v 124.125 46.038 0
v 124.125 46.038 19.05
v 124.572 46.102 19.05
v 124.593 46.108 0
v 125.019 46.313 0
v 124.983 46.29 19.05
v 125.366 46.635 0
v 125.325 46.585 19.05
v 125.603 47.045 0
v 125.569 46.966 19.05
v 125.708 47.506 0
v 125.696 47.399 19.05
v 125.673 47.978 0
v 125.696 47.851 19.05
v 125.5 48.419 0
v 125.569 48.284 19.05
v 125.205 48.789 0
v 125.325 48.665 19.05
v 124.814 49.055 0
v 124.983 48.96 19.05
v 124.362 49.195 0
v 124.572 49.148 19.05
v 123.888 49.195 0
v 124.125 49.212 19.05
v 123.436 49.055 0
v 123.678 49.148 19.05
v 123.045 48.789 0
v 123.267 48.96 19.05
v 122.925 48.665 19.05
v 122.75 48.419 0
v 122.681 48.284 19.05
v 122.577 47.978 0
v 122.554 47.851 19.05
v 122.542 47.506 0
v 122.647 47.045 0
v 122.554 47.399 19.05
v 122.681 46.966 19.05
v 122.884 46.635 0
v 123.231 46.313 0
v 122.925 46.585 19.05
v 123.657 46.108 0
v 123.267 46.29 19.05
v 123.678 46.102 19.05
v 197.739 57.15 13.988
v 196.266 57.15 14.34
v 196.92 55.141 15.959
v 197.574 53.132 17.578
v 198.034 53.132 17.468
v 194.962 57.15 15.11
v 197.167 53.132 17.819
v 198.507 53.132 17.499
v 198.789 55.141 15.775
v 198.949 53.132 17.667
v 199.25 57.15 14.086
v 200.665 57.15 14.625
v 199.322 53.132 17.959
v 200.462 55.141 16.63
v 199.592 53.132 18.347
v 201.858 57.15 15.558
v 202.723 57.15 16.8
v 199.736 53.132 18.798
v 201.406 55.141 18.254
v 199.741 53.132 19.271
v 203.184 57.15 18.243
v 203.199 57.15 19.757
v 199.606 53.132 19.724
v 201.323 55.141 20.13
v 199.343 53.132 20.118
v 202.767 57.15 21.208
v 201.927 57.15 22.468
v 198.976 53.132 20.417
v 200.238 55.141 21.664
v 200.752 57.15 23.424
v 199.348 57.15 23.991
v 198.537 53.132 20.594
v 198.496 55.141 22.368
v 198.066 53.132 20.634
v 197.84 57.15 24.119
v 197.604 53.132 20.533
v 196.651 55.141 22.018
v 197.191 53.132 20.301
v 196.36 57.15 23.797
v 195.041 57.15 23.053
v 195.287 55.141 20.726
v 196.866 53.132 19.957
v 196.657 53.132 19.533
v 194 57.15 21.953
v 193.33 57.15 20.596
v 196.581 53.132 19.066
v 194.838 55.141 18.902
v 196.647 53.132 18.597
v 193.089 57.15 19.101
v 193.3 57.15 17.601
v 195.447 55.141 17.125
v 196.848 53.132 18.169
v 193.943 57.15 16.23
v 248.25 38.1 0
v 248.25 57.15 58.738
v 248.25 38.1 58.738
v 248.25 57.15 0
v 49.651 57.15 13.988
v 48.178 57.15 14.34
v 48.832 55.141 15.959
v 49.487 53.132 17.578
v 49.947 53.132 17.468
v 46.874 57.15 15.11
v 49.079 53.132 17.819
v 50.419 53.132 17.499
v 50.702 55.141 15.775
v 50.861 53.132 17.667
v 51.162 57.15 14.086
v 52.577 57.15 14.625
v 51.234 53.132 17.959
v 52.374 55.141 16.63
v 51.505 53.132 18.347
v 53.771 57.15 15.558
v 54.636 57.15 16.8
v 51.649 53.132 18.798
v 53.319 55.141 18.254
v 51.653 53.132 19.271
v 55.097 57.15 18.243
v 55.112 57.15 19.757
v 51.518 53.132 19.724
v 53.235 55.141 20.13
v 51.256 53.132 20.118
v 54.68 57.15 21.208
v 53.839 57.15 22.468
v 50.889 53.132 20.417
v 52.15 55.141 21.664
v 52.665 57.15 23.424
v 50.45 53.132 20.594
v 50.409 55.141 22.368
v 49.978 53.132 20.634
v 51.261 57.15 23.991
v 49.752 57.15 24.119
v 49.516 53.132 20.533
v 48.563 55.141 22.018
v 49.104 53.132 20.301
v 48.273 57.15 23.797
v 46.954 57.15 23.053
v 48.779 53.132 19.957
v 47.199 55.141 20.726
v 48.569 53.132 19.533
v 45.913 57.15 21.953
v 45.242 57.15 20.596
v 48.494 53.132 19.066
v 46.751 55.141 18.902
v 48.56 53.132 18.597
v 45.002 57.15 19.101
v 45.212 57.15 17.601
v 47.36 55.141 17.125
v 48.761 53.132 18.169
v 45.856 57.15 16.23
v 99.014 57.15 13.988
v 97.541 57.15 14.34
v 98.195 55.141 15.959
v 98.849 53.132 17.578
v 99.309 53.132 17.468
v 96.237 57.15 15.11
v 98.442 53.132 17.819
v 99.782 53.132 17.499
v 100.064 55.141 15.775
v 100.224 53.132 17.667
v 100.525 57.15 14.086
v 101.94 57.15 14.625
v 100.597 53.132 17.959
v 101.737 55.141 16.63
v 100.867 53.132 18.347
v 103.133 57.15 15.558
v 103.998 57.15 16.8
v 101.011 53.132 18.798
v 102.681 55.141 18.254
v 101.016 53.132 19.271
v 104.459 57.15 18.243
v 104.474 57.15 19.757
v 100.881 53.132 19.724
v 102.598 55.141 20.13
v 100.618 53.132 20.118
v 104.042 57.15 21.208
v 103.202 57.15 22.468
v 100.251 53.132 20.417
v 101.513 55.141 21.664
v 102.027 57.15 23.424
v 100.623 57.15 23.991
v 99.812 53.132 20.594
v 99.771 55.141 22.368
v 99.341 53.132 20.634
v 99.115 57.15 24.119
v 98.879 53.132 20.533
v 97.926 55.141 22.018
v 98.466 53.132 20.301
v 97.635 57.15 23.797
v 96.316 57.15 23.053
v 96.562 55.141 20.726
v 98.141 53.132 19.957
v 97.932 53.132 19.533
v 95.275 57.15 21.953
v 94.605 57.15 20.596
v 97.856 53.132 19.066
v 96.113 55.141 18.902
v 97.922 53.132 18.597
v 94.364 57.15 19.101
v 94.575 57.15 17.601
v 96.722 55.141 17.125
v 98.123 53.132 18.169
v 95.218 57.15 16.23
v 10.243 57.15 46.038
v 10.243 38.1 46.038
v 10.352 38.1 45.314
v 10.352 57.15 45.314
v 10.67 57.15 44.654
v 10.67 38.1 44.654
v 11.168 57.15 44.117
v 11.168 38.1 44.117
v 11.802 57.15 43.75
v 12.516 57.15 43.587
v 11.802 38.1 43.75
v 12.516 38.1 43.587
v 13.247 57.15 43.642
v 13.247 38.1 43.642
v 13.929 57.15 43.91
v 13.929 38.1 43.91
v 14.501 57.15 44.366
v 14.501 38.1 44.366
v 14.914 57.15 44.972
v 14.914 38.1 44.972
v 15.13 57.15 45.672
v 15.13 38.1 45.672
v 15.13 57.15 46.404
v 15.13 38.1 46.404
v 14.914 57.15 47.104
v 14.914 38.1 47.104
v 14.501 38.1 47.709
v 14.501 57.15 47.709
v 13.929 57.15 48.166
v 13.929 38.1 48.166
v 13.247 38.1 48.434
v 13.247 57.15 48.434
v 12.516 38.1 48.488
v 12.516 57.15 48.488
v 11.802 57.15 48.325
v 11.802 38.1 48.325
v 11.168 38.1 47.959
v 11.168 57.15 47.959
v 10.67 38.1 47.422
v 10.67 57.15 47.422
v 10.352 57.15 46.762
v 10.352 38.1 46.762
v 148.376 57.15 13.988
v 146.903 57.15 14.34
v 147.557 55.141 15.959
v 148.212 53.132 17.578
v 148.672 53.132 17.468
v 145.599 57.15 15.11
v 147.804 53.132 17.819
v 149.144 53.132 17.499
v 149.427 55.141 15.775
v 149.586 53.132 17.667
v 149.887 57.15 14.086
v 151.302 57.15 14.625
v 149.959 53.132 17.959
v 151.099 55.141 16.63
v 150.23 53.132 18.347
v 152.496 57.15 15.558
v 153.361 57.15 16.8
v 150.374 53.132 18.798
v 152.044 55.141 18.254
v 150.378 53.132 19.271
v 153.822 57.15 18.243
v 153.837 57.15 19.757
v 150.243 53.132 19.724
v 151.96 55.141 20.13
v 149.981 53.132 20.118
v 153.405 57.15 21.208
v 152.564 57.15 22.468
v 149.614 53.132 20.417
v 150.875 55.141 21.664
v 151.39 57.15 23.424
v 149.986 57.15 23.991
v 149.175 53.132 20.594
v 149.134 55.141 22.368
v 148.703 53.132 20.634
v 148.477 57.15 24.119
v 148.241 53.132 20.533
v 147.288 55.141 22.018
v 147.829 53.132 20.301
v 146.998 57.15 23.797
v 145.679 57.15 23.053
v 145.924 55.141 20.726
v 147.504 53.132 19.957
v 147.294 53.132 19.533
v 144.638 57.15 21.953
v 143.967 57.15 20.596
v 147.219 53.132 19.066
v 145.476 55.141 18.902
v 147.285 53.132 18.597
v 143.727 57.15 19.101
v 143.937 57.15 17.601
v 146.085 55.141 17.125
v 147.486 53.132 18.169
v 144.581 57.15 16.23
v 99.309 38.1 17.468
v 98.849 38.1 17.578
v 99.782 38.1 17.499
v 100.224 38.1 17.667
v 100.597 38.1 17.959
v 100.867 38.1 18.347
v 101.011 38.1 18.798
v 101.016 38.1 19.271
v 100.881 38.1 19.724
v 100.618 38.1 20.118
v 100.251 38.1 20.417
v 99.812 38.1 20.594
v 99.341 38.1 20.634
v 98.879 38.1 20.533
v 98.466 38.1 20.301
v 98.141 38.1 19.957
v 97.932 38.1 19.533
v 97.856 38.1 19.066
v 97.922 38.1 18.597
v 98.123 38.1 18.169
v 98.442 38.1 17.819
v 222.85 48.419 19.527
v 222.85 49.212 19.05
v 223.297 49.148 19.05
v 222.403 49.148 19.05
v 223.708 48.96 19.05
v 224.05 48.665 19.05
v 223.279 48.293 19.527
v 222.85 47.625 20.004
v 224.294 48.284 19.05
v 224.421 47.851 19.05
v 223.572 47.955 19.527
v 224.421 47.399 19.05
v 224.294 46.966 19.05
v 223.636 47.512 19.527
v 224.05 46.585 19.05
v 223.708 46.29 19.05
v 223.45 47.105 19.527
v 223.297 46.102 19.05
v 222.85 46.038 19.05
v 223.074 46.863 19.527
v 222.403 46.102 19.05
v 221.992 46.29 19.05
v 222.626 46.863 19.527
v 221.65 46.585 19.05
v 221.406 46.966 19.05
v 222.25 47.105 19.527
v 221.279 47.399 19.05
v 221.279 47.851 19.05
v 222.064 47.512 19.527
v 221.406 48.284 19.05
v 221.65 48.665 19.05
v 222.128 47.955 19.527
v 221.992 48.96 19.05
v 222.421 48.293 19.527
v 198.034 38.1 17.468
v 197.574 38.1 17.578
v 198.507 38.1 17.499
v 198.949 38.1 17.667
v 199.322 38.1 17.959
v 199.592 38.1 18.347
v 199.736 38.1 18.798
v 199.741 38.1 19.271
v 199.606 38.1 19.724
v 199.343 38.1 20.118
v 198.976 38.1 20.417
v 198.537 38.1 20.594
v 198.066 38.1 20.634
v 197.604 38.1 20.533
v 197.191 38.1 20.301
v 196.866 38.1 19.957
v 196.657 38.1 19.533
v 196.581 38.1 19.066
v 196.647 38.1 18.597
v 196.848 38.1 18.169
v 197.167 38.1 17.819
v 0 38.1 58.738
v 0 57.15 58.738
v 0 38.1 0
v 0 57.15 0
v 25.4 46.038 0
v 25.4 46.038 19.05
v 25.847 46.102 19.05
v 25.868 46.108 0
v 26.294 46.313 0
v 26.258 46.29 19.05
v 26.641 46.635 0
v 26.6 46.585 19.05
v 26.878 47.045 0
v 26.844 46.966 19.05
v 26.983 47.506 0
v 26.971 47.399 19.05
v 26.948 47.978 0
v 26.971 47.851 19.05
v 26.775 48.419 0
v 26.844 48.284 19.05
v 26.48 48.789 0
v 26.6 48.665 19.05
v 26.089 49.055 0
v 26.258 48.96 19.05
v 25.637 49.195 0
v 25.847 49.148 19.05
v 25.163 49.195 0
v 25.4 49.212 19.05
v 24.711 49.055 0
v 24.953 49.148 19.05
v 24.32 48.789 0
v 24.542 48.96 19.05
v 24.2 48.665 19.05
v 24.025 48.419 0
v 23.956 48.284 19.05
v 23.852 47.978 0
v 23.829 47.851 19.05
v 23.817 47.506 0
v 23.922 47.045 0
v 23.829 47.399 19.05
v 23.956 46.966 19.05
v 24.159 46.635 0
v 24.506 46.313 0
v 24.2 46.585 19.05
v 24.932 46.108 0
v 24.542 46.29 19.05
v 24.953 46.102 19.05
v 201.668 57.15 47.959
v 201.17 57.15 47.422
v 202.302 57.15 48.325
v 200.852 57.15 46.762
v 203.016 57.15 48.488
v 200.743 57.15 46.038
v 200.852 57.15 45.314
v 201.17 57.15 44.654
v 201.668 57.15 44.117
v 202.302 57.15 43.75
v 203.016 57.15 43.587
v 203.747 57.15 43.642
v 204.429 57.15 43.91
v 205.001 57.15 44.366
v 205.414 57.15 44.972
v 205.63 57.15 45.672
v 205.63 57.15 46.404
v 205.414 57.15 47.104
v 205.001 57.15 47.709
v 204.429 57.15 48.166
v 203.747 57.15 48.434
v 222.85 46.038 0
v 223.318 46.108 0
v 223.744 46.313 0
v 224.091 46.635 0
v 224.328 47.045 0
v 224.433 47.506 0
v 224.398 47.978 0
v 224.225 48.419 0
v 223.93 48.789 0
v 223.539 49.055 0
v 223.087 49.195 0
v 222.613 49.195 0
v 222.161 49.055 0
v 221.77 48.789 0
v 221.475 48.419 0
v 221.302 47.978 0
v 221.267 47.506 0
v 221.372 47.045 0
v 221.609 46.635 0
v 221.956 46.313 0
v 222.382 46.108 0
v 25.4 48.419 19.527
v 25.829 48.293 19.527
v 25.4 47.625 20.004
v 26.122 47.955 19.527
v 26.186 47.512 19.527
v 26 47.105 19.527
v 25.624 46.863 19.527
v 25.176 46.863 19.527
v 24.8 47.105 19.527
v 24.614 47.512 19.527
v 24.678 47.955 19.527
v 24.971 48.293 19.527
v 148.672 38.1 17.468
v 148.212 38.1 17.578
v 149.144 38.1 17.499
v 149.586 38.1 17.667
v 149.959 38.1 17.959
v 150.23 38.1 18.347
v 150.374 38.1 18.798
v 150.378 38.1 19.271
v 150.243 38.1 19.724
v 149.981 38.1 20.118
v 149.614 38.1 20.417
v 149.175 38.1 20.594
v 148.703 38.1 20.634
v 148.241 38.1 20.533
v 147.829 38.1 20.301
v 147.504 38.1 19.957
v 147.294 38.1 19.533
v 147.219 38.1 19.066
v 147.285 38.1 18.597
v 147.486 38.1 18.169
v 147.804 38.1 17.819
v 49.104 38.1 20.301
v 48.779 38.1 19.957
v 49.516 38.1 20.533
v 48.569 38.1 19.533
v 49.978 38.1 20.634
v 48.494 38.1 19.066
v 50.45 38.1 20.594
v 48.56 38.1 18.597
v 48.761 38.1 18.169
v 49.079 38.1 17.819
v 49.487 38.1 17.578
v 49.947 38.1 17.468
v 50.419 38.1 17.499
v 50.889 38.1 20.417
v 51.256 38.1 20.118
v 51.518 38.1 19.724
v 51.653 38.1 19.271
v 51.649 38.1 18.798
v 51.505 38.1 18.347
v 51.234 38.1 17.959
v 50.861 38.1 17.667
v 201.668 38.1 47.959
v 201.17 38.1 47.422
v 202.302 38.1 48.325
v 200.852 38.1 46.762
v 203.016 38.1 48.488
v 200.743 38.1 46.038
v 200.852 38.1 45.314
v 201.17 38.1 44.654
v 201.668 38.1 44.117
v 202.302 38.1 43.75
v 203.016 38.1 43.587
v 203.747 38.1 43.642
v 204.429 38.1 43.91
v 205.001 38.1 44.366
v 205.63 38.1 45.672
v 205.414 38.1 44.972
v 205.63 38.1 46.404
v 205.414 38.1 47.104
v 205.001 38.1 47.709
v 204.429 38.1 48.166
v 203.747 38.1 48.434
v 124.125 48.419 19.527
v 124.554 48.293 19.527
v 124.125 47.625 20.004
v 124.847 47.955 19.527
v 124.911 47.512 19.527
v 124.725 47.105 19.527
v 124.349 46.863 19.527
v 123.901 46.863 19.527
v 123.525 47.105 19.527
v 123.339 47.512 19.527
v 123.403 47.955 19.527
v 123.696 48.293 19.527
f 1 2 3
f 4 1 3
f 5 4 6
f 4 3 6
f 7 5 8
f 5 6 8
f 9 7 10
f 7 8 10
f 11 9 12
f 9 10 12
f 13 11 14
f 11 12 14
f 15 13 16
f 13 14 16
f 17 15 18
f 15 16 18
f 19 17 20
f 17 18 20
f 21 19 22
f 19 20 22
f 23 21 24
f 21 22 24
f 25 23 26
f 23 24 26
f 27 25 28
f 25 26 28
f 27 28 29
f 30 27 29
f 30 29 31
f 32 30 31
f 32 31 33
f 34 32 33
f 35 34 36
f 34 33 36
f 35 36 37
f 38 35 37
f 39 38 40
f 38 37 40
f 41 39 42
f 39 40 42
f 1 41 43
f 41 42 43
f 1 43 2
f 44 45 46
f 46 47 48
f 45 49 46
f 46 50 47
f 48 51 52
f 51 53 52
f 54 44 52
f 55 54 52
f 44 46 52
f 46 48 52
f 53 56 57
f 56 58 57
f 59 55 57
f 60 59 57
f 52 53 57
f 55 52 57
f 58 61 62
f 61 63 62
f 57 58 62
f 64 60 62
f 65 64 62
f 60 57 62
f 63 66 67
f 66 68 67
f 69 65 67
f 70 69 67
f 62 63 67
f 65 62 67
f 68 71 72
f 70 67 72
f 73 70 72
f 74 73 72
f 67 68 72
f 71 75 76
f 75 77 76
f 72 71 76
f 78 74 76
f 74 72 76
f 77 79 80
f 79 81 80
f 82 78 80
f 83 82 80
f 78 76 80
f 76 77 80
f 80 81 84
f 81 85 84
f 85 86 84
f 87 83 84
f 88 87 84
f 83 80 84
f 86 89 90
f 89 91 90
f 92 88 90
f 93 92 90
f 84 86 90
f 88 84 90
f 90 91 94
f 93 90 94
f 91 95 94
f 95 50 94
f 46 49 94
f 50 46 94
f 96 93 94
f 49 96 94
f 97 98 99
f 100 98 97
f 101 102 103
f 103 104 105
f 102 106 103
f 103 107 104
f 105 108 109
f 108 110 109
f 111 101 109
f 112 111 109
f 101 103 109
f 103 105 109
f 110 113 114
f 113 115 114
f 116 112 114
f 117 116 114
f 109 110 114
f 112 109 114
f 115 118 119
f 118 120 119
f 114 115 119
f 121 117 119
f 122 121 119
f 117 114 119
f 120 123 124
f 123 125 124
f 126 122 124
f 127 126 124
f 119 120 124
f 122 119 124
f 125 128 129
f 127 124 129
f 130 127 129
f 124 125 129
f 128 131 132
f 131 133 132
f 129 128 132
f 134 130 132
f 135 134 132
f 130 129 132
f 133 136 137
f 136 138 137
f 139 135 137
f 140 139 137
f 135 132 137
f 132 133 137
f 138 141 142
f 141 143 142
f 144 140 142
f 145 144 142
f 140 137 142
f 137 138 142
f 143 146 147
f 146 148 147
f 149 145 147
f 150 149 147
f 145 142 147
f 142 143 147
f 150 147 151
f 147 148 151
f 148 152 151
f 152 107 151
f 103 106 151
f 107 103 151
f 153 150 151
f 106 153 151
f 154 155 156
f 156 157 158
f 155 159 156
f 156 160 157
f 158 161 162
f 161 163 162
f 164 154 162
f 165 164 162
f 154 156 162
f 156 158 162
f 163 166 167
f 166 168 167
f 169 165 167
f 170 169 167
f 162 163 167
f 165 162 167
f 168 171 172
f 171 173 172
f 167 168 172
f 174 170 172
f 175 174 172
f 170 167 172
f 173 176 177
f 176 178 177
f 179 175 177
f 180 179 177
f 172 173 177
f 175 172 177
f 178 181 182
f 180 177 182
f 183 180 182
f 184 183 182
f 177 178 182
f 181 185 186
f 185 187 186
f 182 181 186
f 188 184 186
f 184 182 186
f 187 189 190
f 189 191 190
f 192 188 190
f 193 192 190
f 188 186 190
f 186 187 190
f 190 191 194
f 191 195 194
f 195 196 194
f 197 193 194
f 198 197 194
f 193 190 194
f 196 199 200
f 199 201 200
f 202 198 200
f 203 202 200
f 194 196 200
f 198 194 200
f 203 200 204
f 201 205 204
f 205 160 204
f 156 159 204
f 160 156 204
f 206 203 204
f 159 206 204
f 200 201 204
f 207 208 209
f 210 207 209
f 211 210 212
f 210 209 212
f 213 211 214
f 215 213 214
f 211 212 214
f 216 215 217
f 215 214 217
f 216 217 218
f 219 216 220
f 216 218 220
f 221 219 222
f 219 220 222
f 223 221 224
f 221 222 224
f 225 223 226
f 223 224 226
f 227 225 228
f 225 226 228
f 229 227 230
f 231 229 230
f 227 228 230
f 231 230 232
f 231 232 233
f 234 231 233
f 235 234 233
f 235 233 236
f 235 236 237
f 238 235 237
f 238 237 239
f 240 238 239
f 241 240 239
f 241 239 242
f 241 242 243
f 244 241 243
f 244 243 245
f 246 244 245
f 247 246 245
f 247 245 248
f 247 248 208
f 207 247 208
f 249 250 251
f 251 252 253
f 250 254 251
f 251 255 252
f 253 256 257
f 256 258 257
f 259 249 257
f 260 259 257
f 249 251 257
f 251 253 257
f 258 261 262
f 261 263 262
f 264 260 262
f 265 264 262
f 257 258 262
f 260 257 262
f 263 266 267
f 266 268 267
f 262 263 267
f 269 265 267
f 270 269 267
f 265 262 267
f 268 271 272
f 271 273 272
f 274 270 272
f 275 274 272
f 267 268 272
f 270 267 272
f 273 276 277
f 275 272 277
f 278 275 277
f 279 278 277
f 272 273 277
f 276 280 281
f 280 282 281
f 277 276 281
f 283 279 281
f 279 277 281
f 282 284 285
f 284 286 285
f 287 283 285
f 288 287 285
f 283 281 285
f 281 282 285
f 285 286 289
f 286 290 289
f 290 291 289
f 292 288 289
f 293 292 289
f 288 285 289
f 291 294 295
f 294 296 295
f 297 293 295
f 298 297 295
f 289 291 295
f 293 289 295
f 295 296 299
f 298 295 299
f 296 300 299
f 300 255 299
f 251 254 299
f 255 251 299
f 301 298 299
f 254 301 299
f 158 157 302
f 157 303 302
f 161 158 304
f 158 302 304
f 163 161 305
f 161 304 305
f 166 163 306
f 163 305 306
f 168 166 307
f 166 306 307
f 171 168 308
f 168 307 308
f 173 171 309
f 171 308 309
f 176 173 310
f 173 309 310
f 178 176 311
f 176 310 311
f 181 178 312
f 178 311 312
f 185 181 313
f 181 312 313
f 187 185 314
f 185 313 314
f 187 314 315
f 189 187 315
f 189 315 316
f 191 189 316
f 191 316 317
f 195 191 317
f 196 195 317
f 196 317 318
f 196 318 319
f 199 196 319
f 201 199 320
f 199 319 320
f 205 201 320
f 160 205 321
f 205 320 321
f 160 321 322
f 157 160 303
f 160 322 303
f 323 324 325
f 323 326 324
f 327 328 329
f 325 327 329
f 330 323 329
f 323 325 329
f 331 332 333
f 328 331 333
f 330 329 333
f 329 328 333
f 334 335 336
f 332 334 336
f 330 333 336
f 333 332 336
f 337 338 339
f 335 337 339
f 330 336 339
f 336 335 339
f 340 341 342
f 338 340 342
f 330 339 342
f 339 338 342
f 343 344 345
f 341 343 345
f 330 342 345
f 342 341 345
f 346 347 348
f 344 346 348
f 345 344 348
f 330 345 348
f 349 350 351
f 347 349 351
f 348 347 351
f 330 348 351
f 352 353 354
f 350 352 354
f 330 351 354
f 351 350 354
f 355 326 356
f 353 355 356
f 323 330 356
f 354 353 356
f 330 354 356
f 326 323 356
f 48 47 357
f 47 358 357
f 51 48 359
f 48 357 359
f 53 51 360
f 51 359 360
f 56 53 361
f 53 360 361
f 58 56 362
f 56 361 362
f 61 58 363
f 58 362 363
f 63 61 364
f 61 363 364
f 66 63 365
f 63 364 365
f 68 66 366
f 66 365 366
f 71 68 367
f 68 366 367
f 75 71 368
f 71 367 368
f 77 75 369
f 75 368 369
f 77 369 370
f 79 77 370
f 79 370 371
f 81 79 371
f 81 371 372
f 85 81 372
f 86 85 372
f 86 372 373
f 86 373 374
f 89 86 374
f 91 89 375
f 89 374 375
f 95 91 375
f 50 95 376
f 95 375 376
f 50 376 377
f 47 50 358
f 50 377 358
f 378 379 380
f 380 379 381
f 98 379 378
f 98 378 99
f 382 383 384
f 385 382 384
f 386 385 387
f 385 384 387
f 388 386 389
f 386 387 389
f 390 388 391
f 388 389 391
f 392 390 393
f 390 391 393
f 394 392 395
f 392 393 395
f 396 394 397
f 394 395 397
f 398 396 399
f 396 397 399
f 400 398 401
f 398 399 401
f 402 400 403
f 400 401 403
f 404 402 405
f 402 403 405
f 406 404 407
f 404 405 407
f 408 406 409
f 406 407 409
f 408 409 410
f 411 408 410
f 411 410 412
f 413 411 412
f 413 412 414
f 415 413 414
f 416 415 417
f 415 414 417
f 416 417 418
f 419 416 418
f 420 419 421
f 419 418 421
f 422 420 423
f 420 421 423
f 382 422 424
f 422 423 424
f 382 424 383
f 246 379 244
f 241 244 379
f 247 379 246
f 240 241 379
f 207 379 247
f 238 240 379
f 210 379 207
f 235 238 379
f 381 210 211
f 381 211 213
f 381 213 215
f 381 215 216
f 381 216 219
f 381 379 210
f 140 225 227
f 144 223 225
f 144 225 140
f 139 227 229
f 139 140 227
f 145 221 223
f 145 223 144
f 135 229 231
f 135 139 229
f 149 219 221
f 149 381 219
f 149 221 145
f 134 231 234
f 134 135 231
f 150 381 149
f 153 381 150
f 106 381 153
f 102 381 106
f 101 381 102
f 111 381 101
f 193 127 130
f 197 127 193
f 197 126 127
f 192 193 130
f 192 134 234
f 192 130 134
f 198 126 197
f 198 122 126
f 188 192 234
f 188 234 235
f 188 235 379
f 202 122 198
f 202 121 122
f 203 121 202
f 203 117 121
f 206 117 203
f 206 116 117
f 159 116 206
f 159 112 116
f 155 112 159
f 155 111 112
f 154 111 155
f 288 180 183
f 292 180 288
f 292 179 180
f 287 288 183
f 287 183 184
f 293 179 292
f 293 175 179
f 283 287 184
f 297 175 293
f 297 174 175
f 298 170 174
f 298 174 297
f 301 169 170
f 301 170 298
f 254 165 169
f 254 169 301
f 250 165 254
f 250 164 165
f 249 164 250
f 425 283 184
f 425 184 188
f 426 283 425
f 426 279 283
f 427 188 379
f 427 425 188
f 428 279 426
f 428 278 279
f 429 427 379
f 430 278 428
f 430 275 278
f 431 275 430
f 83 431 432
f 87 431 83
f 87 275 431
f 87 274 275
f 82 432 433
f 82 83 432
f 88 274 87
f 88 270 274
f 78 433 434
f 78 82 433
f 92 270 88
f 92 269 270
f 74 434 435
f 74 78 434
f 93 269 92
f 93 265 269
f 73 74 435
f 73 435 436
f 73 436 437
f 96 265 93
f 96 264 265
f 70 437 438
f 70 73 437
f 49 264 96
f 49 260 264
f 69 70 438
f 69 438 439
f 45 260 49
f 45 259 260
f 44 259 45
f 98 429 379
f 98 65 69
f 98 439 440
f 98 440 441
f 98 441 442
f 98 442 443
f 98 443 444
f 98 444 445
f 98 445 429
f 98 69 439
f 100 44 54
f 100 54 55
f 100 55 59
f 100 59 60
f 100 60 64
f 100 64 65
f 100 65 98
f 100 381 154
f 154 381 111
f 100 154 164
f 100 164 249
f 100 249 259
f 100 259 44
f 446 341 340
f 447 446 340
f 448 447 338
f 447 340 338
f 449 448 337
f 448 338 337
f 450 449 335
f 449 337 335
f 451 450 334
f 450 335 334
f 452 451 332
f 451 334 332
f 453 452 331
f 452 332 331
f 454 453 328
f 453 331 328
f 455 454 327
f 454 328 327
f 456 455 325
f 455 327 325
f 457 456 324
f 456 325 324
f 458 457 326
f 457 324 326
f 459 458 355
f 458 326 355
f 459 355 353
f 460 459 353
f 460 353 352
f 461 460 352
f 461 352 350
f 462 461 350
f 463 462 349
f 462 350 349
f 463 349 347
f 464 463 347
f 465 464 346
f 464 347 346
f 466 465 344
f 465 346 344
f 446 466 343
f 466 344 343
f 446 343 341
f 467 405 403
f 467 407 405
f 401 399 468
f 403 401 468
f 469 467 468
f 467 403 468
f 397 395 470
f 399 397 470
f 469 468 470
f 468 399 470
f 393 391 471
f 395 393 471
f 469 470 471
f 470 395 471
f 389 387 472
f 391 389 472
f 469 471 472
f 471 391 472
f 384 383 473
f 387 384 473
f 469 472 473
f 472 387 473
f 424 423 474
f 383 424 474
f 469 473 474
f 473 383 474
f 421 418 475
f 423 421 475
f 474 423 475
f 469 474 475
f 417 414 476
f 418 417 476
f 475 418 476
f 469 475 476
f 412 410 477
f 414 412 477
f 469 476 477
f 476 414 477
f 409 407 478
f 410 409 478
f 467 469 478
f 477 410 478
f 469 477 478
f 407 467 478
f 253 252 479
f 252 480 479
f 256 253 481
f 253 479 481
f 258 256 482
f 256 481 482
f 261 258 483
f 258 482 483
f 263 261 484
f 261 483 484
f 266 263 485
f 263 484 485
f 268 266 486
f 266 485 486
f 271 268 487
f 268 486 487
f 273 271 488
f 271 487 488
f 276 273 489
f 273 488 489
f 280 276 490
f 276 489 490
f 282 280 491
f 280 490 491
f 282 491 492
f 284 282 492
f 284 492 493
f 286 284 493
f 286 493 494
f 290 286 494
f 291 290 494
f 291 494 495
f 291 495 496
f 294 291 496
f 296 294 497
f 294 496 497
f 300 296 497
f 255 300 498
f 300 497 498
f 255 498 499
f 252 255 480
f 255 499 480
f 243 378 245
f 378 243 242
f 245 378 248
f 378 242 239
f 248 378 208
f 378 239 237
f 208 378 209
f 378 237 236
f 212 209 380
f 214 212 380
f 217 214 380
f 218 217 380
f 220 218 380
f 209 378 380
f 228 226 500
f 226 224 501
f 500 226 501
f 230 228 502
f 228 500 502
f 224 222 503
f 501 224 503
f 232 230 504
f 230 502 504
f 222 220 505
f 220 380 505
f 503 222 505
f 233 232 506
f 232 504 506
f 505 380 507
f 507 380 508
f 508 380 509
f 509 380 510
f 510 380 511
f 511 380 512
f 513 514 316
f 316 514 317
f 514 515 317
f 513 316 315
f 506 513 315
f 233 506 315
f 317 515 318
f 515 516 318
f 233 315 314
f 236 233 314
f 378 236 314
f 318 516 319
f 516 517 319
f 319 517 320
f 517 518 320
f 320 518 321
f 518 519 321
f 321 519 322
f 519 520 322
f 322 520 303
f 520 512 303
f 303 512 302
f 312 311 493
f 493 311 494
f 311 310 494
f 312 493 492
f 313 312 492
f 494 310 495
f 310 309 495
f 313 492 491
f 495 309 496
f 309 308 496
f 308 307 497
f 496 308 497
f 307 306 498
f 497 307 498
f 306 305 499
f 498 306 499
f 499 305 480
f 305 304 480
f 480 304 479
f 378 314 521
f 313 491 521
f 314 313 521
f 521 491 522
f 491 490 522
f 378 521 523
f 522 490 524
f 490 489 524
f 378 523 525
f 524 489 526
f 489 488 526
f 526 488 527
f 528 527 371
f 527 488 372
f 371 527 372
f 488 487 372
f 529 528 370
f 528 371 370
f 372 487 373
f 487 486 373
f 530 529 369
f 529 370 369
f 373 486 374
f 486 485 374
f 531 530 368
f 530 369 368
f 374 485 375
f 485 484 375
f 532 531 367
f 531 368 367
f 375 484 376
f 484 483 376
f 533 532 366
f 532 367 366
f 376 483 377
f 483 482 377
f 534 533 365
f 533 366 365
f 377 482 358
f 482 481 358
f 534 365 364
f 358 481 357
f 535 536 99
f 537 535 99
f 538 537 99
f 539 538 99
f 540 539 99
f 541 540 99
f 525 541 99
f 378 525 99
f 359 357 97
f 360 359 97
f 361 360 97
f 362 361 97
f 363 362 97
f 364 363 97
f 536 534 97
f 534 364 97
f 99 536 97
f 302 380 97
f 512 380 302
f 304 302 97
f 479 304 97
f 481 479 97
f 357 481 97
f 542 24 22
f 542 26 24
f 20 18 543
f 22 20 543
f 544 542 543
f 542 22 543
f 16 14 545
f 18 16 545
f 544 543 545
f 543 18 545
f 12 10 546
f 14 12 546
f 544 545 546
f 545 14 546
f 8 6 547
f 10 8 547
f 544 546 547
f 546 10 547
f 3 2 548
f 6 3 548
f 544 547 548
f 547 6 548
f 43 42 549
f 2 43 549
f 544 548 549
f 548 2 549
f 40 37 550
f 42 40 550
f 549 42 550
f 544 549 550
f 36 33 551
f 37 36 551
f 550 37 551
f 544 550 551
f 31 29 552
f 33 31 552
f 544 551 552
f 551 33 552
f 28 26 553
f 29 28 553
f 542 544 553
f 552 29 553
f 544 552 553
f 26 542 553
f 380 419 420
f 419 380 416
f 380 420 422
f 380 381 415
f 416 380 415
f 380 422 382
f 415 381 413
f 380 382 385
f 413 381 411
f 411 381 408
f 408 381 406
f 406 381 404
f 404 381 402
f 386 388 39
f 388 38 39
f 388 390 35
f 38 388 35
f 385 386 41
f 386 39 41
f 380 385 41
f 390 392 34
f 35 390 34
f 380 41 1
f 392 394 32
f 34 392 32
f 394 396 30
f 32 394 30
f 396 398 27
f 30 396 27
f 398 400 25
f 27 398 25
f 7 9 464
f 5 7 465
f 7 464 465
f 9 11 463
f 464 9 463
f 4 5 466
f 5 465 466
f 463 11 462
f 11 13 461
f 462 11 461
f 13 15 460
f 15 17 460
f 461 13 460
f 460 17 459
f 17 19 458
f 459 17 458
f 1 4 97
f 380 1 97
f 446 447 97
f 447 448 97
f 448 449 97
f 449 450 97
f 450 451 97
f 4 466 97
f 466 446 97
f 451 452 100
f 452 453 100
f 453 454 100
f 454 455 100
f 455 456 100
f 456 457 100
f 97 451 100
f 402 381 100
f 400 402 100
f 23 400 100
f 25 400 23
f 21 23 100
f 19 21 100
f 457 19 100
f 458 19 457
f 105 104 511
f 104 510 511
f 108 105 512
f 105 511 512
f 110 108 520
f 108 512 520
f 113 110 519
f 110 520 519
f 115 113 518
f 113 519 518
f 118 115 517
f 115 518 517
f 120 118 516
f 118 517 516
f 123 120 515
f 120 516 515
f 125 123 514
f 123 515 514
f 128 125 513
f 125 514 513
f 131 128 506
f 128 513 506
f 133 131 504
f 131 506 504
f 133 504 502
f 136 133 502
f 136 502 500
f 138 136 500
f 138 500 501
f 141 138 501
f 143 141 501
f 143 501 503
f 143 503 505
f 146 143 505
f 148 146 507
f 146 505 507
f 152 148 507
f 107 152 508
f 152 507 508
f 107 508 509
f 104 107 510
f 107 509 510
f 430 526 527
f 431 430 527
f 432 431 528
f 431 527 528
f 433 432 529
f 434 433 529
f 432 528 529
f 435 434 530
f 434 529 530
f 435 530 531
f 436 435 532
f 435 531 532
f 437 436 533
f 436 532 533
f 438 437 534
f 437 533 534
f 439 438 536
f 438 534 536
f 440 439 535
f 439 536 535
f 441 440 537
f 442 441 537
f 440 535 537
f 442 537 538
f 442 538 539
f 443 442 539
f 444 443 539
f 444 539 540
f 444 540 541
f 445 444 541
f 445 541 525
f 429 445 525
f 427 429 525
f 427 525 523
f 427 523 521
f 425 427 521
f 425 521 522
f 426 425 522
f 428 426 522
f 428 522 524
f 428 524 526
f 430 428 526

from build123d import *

# Parameters (mm, degrees)
SKETCH1_W             = 248.25
SKETCH1_H             = 19.05
BOSS_EXTRUDE1_DEPTH   = 38.1
HOLE1_D               = 3.175
HOLE1_DEPTH           = 31.75
HOLE1_CSINK_D         = 10.16
HOLE1_CSINK_ANGLE     = 82
HOLE1_TIP             = 0.953866233
HOLE2_D               = 3.175
HOLE2_DEPTH           = 57.15
HOLE2_CSINK_D         = 10.16
HOLE2_CSINK_ANGLE     = 82
HOLE2_TIP             = 0.953866233
SKETCH6_W             = 248.25
SKETCH6_H             = 20.637862114
BOSS_EXTRUDE3_DEPTH   = 19.05
F_8_CLEARANCE_HOLE1_D = 4.9149


with BuildPart() as part:
    # Sketch1 → Boss-Extrude1 (new body)
    with BuildSketch(Plane.XY):
        with Locations((124.125, 47.625)):
            Rectangle(SKETCH1_W, SKETCH1_H)
    extrude(amount=BOSS_EXTRUDE1_DEPTH)

    # Hole1
    with Locations(Plane(origin=(-1090.512770337, -52.974999997, -12.7), x_dir=(0, 1, 0), z_dir=(0, 0, -1))):
        with Locations((-100.332047386, 1313.362770337), (100.599999997, 1313.362770337), (100.599999997, 1115.912770337), (100.599999997, 1214.637770337), (-100.332047386, 1214.637770337), (-100.332047386, 1115.912770337)):
            CounterSinkHole(HOLE1_D / 2, HOLE1_CSINK_D / 2, depth=HOLE1_DEPTH, counter_sink_angle=HOLE1_CSINK_ANGLE)
            with Locations((0, 0, -(HOLE1_DEPTH + HOLE1_TIP / 2))):  # 118° drill point
                Cone(0, HOLE1_D / 2, HOLE1_TIP, mode=Mode.SUBTRACT)

    # Hole2
    with Locations(Plane(origin=(-1090.512770337, 57.15, -415.792401694), x_dir=(0.3746065934159092, 0, 0.9271838545667885), z_dir=(0, 1, 0))):
        with Locations((848.944412528, 940.413642522), (885.927448463, 1031.949868564), (867.435930496, 986.181755543), (830.452894561, 894.645529501)):
            CounterSinkHole(HOLE2_D / 2, HOLE2_CSINK_D / 2, depth=HOLE2_DEPTH, counter_sink_angle=HOLE2_CSINK_ANGLE)
            with Locations((0, 0, -(HOLE2_DEPTH + HOLE2_TIP / 2))):  # 118° drill point
                Cone(0, HOLE2_D / 2, HOLE2_TIP, mode=Mode.SUBTRACT)

    # Sketch6 → Boss-Extrude3 (add)
    with BuildSketch(Plane(origin=(0, 57.15, 0), x_dir=(1, 0, 0), z_dir=(0, 1, 0))):
        with Locations((124.125, -48.418931057)):
            Rectangle(SKETCH6_W, SKETCH6_H)
    extrude(amount=-BOSS_EXTRUDE3_DEPTH)

    # #8 Clearance Hole1 (through all)
    with Locations(Plane(origin=(0, 57.15, 0), x_dir=(1, 0, 0), z_dir=(0, 1, 0))):
        with Locations((12.7, -46.037862114), (203.2, -46.037862114)):
            Hole(F_8_CLEARANCE_HOLE1_D / 2)


solid = part.part
